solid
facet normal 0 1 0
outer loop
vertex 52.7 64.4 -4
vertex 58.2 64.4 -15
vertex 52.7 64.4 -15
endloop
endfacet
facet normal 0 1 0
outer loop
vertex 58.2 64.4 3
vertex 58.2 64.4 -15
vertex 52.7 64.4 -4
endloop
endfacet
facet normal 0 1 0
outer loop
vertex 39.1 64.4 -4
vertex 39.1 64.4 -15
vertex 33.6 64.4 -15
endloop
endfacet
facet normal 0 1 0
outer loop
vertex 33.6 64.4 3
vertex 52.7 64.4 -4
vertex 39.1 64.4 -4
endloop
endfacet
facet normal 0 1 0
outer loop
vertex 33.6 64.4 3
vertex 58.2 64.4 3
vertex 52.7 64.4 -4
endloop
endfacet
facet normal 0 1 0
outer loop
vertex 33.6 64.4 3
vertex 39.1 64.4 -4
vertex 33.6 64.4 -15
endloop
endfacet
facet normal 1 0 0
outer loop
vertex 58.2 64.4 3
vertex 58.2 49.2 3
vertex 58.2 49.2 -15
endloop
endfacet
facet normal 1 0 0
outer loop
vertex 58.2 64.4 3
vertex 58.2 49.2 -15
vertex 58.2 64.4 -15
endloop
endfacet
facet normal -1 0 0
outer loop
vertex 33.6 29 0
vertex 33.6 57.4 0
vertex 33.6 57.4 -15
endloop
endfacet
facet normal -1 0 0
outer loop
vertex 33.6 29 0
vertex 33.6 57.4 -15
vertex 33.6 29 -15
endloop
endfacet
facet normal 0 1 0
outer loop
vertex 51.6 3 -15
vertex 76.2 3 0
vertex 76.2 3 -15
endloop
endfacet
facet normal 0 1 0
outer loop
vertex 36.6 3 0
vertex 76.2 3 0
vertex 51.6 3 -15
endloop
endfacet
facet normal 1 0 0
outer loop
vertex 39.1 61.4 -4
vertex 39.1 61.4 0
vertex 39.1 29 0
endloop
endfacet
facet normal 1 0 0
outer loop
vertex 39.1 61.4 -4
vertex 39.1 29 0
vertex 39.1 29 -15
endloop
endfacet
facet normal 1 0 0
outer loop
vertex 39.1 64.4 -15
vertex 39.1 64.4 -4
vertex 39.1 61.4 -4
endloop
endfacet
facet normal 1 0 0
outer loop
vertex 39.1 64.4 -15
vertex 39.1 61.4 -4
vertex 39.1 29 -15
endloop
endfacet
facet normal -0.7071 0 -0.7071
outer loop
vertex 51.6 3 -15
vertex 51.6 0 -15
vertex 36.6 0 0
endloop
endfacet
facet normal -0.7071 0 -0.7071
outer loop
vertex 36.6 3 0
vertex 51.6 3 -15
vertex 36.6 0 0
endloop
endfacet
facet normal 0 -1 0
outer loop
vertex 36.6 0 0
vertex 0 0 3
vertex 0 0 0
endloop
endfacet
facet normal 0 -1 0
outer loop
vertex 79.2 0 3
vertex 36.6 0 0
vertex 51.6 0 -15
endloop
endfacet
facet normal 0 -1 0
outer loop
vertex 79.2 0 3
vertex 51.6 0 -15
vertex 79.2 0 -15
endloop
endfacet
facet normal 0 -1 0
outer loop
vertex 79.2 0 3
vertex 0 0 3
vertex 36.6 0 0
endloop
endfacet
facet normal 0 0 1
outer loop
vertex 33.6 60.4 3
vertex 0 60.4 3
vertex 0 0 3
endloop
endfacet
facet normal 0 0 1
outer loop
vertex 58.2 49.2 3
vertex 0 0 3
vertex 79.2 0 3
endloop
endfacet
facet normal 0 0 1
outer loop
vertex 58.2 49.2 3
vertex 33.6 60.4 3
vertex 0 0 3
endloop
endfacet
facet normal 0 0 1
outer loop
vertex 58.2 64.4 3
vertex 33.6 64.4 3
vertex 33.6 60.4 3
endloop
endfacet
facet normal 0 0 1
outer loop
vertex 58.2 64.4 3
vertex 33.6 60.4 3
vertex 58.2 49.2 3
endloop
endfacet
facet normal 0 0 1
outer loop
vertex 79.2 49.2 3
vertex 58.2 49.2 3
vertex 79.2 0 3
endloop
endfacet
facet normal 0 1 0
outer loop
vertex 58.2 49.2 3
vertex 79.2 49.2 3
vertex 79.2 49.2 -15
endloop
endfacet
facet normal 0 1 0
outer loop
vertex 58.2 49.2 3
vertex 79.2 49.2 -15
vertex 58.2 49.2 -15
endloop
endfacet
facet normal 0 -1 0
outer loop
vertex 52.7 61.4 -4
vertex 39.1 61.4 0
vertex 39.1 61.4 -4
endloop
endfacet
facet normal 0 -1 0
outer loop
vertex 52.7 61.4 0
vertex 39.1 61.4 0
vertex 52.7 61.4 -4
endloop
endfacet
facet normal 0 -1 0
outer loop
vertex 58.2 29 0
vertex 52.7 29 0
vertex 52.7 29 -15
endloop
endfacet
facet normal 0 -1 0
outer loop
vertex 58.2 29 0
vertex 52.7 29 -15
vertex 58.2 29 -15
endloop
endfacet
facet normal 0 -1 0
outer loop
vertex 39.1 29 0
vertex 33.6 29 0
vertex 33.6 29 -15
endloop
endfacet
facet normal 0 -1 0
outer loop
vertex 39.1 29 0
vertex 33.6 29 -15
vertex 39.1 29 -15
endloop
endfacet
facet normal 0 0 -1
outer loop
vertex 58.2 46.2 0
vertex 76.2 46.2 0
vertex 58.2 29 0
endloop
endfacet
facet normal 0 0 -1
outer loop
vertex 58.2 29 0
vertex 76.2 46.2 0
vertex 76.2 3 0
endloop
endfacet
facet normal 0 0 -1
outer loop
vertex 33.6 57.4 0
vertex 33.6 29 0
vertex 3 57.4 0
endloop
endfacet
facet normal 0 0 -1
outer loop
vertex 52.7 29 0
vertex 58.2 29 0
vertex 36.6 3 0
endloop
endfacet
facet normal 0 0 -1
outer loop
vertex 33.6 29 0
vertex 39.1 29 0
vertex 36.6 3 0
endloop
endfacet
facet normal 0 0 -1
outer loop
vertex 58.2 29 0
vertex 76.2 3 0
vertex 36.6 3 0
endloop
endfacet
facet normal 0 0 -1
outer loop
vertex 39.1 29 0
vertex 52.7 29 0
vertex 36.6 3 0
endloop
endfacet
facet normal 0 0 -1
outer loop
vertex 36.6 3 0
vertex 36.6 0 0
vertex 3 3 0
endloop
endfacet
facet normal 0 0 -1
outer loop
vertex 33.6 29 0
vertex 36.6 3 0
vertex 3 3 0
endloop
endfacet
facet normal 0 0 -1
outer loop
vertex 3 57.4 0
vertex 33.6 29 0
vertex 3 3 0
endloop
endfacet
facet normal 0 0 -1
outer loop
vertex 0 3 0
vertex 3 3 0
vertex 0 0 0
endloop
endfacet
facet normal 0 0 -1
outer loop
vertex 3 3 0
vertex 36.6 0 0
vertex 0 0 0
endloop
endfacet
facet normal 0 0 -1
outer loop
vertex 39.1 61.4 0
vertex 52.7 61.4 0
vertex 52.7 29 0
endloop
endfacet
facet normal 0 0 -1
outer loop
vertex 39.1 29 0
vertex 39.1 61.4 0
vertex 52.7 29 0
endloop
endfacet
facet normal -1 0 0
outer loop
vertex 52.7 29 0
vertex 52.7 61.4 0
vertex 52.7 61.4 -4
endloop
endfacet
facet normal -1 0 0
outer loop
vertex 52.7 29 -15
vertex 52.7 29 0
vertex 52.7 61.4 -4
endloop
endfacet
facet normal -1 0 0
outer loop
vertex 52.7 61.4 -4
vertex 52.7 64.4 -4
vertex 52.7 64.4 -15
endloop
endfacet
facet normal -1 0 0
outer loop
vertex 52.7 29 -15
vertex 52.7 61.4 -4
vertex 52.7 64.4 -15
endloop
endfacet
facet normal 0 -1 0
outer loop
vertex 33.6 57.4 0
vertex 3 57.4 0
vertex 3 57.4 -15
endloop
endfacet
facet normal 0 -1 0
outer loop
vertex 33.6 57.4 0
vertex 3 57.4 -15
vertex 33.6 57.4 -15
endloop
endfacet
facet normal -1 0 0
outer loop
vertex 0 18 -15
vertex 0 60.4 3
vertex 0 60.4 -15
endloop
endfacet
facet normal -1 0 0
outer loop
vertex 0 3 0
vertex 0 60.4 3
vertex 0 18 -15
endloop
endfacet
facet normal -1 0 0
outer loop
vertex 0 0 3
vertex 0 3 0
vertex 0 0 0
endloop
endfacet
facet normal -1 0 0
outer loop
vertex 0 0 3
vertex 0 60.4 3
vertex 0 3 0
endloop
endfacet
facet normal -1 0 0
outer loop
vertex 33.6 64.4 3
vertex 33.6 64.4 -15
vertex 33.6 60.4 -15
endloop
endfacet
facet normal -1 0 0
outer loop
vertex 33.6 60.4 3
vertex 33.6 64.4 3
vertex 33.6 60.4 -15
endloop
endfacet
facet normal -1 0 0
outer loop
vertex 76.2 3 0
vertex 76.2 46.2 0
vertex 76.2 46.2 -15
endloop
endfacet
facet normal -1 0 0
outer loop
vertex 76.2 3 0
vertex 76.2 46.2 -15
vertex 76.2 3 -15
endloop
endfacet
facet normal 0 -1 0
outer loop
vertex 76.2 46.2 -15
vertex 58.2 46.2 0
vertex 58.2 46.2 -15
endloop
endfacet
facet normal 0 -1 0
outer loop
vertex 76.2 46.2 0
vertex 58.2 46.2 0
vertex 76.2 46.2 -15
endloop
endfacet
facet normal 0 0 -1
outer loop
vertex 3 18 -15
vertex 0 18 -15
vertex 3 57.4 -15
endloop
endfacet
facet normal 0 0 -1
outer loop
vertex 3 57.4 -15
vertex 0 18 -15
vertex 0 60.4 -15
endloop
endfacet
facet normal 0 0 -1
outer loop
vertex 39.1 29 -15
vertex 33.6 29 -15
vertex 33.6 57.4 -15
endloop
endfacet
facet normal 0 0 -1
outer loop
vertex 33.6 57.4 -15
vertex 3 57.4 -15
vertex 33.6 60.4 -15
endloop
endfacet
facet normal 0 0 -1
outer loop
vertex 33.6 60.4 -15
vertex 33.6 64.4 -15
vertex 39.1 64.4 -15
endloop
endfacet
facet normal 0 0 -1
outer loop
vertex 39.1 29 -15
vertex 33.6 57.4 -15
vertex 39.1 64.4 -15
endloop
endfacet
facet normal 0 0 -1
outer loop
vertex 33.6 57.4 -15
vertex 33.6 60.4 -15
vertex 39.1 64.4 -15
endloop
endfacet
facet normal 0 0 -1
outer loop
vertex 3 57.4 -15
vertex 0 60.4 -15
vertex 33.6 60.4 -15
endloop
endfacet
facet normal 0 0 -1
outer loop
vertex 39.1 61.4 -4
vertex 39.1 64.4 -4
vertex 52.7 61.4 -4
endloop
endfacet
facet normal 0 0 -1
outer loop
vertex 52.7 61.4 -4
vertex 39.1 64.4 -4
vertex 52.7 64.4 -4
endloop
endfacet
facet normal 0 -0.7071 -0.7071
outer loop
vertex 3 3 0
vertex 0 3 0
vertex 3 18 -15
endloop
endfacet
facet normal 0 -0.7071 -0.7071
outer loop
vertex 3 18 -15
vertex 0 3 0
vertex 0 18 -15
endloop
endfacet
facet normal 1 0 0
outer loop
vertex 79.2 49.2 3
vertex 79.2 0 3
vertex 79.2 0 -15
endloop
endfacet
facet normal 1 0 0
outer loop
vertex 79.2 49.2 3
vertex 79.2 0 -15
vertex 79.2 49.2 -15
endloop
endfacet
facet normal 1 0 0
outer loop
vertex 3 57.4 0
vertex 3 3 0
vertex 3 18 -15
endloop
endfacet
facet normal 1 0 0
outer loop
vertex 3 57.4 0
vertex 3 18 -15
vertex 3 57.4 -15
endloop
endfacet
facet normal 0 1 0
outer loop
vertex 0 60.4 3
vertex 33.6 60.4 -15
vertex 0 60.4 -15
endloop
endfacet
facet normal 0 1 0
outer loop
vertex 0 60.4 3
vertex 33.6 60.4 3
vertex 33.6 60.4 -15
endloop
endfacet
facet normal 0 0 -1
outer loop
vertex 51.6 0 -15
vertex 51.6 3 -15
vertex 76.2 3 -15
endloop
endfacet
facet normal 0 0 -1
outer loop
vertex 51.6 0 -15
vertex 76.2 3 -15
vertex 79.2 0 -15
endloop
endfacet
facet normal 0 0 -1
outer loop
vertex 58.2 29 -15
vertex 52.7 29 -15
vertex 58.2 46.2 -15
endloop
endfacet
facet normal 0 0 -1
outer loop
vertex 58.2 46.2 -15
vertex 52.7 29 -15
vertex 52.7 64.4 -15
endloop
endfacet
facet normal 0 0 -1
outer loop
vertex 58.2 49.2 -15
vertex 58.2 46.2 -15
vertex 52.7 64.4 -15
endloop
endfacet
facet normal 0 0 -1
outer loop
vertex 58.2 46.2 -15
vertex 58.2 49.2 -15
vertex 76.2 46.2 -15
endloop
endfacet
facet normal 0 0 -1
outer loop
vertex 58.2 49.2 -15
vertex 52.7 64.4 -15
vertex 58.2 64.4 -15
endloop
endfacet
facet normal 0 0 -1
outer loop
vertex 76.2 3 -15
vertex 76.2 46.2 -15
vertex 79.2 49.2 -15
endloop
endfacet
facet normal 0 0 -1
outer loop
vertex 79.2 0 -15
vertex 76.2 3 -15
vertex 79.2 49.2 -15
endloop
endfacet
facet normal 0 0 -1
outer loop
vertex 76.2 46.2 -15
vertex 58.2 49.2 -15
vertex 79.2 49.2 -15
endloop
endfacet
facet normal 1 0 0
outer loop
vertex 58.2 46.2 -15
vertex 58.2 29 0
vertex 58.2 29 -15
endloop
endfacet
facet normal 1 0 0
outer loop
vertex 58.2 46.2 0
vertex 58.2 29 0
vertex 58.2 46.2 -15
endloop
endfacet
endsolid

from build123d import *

# Parameters (mm, degrees)
BOSS_EXTRUDE3_DEPTH = 3
BOSS_EXTRUDE4_DEPTH = 15
CUT_EXTRUDE1_DEPTH  = 3
CUT_EXTRUDE2_DEPTH  = 3
SKETCH4_W           = 13.6
SKETCH4_H           = 11
CUT_EXTRUDE3_DEPTH  = 3
CUT_EXTRUDE4_DEPTH  = 3


with BuildPart() as part:
    # Sketch1 → Boss-Extrude3 (new body)
    with BuildSketch(Plane.XY):
        Polygon((0, 0), (79.2, 0), (79.2, 49.2), (58.2, 49.2), (58.2, 64.4), (33.6, 64.4), (33.6, 60.4), (0, 60.4), align=None)
    extrude(amount=BOSS_EXTRUDE3_DEPTH)

    # Sketch1<9> → Boss-Extrude4 (add)
    with BuildSketch(Plane.XY):
        Polygon((0, 0), (79.2, 0), (79.2, 49.2), (58.2, 49.2), (58.2, 64.4), (33.6, 64.4), (33.6, 60.4), (0, 60.4), align=None)
        Polygon((76.2, 3), (3, 3), (3, 57.4), (33.6, 57.4), (33.6, 29), (39.1, 29), (39.1, 61.4), (52.7, 61.4), (52.7, 29), (58.2, 29), (58.2, 46.2), (76.2, 46.2), align=None, mode=Mode.SUBTRACT)
    extrude(amount=-BOSS_EXTRUDE4_DEPTH)

    # Sketch2 → Cut-Extrude1 (cut)
    with BuildSketch(Plane(origin=(0, 0, 0), x_dir=(-1, 0, 0), z_dir=(0, -1, 0))):
        Polygon((0, 0), (0, 15), (-33.6, 15), (-18.6, 0), align=None)
    extrude(amount=-CUT_EXTRUDE1_DEPTH, mode=Mode.SUBTRACT)

    # Sketch3 → Cut-Extrude2 (cut)
    with BuildSketch(Plane.ZY):
        Polygon((0, 3), (-15, 18), (-15, 3), align=None)
    extrude(amount=-CUT_EXTRUDE2_DEPTH, mode=Mode.SUBTRACT)

    # Sketch4 → Cut-Extrude3 (cut)
    with BuildSketch(Plane(origin=(0, 64.4, 0), x_dir=(1, 0, 0), z_dir=(0, 1, 0))):
        with Locations((45.9, 9.5)):
            Rectangle(SKETCH4_W, SKETCH4_H)
    extrude(amount=-CUT_EXTRUDE3_DEPTH, mode=Mode.SUBTRACT)

    # Sketch5 → Cut-Extrude4 (cut)
    with BuildSketch(Plane(origin=(0, 0, 0), x_dir=(-1, 0, 0), z_dir=(0, -1, 0))):
        Polygon((-33.6, 15), (-51.6, 15), (-36.6, 0), (-18.6, 0), align=None)
    extrude(amount=-CUT_EXTRUDE4_DEPTH, mode=Mode.SUBTRACT)


solid = part.part
